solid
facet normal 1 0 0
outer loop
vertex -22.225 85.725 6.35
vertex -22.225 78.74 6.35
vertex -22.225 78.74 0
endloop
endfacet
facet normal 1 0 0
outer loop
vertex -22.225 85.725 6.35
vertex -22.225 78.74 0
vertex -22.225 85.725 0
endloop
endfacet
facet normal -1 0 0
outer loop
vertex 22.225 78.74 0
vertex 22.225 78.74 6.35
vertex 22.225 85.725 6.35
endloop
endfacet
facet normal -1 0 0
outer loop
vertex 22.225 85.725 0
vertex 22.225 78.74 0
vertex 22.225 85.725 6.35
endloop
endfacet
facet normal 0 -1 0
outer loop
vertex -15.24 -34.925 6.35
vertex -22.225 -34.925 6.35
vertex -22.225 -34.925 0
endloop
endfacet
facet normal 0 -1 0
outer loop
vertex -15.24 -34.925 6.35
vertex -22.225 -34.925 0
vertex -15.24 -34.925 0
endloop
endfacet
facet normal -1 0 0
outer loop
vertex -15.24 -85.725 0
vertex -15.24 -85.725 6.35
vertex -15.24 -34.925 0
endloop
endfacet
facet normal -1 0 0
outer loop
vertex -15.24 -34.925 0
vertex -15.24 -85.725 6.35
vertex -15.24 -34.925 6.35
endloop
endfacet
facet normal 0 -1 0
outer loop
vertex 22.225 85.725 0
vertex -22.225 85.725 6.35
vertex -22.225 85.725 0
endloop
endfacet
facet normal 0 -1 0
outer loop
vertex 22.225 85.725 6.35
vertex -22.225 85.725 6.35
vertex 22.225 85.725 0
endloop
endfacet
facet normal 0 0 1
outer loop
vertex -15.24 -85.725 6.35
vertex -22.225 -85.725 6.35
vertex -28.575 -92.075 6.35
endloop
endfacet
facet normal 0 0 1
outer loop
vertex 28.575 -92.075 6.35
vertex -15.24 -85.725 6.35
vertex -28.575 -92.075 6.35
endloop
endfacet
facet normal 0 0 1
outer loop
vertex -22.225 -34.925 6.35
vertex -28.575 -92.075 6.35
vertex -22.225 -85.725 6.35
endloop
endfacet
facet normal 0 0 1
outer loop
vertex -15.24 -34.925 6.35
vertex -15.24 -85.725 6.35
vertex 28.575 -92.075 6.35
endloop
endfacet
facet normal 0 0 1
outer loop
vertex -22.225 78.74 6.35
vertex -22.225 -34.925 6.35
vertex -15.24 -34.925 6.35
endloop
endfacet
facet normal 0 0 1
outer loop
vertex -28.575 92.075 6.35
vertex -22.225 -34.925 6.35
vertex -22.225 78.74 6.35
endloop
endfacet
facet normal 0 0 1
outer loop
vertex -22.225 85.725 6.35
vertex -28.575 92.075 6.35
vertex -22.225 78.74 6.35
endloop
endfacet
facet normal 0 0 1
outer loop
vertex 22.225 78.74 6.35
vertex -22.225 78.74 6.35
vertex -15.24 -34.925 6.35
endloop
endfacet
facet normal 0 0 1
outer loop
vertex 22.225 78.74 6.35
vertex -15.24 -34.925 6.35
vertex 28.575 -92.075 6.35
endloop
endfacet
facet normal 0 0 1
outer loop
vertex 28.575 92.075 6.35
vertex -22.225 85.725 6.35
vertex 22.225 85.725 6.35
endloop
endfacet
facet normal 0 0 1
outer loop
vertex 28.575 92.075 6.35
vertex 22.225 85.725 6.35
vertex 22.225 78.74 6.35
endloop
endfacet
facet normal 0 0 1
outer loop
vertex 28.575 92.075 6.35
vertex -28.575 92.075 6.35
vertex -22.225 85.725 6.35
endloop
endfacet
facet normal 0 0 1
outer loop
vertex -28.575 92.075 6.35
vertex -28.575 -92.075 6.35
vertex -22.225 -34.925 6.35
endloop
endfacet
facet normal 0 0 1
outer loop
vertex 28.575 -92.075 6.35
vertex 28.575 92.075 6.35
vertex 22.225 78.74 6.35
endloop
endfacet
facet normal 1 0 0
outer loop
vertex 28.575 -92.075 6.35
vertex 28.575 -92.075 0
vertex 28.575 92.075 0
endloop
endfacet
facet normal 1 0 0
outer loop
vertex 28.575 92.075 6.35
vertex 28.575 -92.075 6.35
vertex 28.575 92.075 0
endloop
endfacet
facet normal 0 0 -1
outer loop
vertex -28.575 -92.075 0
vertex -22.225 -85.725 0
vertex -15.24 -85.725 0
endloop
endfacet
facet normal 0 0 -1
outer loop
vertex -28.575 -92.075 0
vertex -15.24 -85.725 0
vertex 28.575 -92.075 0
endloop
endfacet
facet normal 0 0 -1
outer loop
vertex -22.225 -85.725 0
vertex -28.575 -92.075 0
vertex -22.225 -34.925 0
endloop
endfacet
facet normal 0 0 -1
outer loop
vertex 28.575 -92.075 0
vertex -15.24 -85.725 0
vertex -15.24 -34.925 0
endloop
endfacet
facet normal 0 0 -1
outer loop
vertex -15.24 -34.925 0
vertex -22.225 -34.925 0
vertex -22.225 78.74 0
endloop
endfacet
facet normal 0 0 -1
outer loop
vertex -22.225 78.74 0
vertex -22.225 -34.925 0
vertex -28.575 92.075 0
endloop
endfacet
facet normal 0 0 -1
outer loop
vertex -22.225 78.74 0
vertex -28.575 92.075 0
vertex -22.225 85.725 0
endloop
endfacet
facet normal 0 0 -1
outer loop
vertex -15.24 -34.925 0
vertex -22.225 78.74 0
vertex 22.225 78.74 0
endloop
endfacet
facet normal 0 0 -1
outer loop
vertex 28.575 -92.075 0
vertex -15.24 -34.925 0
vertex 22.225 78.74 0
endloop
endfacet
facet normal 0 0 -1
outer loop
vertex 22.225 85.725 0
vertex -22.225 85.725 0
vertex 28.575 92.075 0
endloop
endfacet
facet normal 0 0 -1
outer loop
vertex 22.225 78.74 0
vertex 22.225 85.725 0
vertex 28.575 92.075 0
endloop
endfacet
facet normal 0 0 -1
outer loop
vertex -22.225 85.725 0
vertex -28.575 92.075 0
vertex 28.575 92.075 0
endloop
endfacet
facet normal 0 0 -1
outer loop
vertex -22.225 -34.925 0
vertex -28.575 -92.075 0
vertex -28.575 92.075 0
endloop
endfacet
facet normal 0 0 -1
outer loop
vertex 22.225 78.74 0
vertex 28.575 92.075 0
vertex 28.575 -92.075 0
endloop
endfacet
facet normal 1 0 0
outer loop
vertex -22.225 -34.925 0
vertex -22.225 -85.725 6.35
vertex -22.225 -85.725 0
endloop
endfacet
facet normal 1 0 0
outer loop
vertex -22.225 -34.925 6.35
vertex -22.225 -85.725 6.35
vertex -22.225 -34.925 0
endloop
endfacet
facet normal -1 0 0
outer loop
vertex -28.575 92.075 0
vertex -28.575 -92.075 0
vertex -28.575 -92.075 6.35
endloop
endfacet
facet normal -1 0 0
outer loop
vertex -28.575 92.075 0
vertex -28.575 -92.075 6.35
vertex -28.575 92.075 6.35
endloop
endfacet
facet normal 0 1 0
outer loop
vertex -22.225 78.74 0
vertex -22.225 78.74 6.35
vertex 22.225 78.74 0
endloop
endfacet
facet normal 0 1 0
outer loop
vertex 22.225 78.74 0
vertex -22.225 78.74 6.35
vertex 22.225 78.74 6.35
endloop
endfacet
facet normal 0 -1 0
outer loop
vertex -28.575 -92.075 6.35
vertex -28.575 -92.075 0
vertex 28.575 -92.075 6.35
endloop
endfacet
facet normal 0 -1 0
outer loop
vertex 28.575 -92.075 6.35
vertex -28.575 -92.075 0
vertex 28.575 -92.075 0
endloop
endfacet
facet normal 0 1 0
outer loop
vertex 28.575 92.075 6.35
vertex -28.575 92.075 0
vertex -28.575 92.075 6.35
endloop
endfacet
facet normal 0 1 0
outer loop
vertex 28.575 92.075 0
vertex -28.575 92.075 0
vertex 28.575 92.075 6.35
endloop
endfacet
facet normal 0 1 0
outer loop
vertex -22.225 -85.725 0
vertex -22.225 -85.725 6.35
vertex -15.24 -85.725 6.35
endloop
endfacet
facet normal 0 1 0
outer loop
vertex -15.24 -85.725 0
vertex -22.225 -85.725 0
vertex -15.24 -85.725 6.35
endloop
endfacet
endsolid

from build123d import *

# Parameters (mm, degrees)
SKETCH2_W           = 57.15
SKETCH2_H           = 184.15
BOSS_EXTRUDE1_DEPTH = 6.35
SKETCH3_W           = 44.45
SKETCH3_H           = 6.985
CUT_EXTRUDE1_DEPTH  = 97.616037747
SKETCH4_W           = 6.985
SKETCH4_H           = 50.8
CUT_EXTRUDE2_DEPTH  = 97.616037747


with BuildPart() as part:
    # Sketch2 → Boss-Extrude1 (new body)
    with BuildSketch(Plane.XY):
        Rectangle(SKETCH2_W, SKETCH2_H)
    extrude(amount=BOSS_EXTRUDE1_DEPTH)

    # Sketch3 → Cut-Extrude1 (cut, through all)
    with BuildSketch(Plane.XY.offset(6.35)):
        with Locations((0, 82.2325)):
            Rectangle(SKETCH3_W, SKETCH3_H)
    extrude(amount=-CUT_EXTRUDE1_DEPTH, mode=Mode.SUBTRACT)

    # Sketch4 → Cut-Extrude2 (cut, through all)
    with BuildSketch(Plane.XY.offset(6.35)):
        with Locations((-18.7325, -60.325)):
            Rectangle(SKETCH4_W, SKETCH4_H)
    extrude(amount=-CUT_EXTRUDE2_DEPTH, mode=Mode.SUBTRACT)


solid = part.part
